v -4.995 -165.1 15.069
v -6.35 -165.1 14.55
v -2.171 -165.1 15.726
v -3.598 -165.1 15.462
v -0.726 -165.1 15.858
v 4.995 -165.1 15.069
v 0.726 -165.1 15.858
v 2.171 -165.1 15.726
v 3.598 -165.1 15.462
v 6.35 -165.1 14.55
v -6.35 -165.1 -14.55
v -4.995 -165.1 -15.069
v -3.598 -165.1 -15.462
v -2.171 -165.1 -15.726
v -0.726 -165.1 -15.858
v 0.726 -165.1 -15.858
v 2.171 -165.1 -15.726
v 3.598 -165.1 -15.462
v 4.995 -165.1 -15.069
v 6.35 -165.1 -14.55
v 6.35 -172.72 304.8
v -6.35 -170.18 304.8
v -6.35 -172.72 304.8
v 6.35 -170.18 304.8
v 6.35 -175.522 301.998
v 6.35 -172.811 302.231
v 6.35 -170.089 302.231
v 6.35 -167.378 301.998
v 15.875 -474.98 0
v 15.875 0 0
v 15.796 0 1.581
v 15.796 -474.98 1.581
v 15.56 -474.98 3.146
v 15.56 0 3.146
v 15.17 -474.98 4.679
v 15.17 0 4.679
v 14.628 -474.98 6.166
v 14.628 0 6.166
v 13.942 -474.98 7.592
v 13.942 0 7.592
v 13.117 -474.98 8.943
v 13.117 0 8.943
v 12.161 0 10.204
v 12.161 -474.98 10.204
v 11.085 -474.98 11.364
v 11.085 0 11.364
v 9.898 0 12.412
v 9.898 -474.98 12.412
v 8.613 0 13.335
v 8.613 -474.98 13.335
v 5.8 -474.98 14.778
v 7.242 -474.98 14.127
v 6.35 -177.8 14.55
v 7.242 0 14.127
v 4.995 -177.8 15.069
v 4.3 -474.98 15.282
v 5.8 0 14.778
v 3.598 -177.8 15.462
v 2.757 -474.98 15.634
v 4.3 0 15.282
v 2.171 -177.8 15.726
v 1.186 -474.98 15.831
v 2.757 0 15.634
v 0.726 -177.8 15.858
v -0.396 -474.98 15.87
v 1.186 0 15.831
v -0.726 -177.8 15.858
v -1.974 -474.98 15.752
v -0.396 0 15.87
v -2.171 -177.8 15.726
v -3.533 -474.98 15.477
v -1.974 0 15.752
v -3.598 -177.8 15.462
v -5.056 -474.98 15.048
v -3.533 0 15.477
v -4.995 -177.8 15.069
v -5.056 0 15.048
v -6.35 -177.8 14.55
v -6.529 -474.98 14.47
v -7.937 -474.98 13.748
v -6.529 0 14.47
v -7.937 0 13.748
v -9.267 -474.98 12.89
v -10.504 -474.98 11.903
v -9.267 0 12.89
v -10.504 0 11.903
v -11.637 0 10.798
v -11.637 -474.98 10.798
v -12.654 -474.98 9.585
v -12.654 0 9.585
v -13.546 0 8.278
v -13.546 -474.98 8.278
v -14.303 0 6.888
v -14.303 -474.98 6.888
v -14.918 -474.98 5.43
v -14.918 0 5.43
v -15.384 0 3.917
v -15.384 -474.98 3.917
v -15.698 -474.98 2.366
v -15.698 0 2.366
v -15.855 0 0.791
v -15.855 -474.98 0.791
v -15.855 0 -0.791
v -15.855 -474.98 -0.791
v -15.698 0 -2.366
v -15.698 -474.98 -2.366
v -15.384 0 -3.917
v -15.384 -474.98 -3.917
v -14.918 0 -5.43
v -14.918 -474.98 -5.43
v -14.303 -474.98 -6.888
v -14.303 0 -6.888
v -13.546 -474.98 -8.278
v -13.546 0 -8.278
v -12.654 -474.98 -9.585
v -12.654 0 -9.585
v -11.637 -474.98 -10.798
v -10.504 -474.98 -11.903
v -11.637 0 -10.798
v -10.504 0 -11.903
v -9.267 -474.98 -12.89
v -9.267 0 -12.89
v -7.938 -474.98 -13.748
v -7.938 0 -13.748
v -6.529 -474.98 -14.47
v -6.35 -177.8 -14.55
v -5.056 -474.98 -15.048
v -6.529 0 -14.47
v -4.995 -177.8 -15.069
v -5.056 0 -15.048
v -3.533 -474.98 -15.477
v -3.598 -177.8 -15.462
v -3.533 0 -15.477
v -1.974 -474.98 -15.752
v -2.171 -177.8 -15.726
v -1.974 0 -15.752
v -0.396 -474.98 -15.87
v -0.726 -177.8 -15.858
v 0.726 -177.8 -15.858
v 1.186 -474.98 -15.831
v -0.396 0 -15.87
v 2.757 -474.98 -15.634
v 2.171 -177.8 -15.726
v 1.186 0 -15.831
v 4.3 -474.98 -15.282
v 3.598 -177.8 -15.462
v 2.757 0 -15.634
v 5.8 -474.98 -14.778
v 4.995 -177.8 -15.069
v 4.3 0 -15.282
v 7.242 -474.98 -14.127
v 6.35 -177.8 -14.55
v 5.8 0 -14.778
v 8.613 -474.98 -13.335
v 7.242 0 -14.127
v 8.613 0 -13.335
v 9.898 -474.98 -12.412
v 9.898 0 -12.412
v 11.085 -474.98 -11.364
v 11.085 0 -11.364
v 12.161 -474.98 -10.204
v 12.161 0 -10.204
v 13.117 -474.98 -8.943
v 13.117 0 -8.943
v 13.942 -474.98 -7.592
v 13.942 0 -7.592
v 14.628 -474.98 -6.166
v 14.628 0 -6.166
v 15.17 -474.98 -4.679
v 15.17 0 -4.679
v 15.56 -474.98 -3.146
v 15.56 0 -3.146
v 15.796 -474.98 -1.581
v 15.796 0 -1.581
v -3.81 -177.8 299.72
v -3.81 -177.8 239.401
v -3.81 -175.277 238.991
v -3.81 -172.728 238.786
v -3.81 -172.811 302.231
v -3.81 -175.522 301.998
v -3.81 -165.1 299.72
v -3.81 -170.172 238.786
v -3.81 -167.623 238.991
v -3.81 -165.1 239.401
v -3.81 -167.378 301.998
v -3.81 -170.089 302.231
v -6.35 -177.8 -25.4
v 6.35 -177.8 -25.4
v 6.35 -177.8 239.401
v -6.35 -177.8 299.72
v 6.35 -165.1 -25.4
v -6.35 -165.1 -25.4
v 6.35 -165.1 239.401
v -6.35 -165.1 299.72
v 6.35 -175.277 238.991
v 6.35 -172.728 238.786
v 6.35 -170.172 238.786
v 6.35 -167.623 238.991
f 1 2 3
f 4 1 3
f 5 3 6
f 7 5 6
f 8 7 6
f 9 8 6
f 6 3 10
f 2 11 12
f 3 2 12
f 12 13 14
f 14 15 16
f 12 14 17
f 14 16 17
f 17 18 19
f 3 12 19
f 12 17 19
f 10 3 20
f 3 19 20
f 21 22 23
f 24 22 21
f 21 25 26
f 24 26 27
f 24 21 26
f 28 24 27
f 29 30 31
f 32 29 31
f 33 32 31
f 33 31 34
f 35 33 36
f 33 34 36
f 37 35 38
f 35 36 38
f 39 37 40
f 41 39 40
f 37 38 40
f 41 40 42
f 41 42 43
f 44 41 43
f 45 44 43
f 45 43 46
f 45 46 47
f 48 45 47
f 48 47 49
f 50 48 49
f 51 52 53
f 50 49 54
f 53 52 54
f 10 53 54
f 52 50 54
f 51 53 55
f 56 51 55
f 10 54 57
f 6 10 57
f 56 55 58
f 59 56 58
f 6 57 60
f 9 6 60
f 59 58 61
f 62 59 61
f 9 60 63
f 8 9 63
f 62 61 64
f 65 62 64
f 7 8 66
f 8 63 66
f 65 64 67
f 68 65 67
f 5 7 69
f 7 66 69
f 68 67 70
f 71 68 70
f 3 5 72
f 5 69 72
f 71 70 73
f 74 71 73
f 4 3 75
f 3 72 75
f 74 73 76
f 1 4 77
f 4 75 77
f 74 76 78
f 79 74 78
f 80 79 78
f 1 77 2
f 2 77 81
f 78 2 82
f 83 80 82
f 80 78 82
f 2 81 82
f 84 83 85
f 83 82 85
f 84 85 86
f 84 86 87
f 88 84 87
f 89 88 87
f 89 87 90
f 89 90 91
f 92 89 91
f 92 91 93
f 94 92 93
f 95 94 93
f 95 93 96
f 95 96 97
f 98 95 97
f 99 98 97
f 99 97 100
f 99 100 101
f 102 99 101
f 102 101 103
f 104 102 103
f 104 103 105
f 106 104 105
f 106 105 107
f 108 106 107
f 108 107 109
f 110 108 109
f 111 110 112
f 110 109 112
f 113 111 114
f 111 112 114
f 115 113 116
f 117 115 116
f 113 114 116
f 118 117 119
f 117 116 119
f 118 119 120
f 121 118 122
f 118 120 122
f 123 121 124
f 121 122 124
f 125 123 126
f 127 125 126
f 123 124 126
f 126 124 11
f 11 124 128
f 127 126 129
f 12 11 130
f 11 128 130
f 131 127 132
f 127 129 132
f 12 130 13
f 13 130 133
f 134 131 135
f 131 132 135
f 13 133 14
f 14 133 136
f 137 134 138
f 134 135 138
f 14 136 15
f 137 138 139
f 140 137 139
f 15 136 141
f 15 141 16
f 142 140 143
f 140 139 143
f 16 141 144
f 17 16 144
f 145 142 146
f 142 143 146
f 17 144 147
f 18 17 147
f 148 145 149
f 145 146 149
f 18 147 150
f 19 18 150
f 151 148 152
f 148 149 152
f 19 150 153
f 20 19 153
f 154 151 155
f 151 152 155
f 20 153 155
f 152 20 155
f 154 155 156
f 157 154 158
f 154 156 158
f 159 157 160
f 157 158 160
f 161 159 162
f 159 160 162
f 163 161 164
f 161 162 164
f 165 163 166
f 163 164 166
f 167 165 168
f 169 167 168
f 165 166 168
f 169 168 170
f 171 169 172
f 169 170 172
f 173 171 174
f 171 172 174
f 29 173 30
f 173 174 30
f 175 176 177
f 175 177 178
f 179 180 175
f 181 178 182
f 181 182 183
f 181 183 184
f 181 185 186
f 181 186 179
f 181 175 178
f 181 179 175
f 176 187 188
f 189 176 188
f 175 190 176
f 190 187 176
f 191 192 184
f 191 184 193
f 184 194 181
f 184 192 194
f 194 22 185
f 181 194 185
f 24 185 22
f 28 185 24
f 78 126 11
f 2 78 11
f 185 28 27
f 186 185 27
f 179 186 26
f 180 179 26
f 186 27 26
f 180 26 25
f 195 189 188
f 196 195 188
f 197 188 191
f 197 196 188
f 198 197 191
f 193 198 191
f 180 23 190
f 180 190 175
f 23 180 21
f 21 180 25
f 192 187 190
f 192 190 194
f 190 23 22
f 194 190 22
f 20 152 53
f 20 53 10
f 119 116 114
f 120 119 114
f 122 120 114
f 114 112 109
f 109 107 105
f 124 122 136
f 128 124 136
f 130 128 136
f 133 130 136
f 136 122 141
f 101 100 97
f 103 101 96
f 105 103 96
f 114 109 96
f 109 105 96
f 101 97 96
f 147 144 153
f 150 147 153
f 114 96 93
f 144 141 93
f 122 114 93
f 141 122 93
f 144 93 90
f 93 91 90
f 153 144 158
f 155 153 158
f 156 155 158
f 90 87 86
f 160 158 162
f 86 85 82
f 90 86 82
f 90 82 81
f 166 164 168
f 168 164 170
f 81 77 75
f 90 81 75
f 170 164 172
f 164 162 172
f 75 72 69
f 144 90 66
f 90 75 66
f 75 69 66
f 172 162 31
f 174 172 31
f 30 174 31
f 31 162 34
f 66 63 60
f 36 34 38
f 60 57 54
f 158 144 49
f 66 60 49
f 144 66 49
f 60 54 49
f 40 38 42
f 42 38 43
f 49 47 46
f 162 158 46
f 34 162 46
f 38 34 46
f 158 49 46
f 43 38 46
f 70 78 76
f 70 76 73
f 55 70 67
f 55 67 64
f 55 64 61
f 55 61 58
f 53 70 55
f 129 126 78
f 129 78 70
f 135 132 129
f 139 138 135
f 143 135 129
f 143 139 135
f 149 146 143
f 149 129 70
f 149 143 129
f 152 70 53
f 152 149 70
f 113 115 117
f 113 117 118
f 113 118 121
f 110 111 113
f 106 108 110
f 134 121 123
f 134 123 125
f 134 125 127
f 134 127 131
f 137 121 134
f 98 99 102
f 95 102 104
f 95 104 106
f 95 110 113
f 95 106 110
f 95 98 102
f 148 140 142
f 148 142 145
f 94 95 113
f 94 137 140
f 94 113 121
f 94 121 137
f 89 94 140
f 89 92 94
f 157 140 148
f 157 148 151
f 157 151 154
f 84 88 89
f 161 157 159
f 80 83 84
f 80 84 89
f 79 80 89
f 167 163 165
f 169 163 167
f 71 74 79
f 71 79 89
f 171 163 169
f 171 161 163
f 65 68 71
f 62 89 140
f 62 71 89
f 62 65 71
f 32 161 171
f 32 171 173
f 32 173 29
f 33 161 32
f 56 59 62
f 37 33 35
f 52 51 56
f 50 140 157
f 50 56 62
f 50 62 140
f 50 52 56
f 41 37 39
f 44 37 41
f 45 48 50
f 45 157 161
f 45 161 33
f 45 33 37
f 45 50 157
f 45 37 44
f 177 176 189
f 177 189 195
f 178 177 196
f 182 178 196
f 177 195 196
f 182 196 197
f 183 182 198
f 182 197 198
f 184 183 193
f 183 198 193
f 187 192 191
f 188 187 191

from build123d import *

# Parameters (mm, degrees)
F0_R          = 15.875
F1_DEPTH      = 474.98
F2_W          = 12.7
F2_H          = 12.7
F3_DEPTH      = 15.876
F3_DEPTH_BACK = 15.876
F4_DEPTH      = 304.8
F4_DEPTH_BACK = 25.4
F6_SIZE       = 5.08
F7_DEPTH      = 10.16


with BuildPart() as f1:
    # F0 (on Front) → F1 (new body)
    with BuildSketch(Plane.XZ):
        Circle(F0_R)
    extrude(amount=F1_DEPTH)

    # F2 (on Top) → F3 (cut, two sides)
    with BuildSketch(Plane.XY) as f3_sk:
        with Locations((0, -171.45)):
            Rectangle(F2_W, F2_H)
    extrude(amount=-F3_DEPTH, mode=Mode.SUBTRACT)
    extrude(f3_sk.sketch, amount=F3_DEPTH_BACK, mode=Mode.SUBTRACT)


with BuildPart() as f4:
    # F2 (on Top) → F4 (new body, two sides)
    with BuildSketch(Plane.XY) as f4_sk:
        with Locations((0, -171.45)):
            Rectangle(F2_W, F2_H)
    extrude(amount=F4_DEPTH)
    extrude(f4_sk.sketch, amount=-F4_DEPTH_BACK)

    # F6
    f6_edges = [f4.edges().sort_by_distance(p)[0] for p in [
        (0, -177.8, 304.8),
        (0, -165.1, 304.8),
    ]]
    chamfer(f6_edges, length=F6_SIZE)

    # F5 (on face) → F7 (cut)
    with BuildSketch(Plane.YZ.offset(6.35)):
        with BuildLine():
            Line((-165.1, 239.4014802667), (-165.1, 301.6185197333))
            ThreePointArc((-165.1, 301.6185197333), (-171.45, 302.26), (-177.8, 301.6185197333))
            Line((-177.8, 301.6185197333), (-177.8, 239.4014802667))
            ThreePointArc((-177.8, 239.4014802667), (-171.45, 238.76), (-165.1, 239.4014802667))
        make_face()
    extrude(amount=-F7_DEPTH, mode=Mode.SUBTRACT)


solid = Compound([f1.part, f4.part])
